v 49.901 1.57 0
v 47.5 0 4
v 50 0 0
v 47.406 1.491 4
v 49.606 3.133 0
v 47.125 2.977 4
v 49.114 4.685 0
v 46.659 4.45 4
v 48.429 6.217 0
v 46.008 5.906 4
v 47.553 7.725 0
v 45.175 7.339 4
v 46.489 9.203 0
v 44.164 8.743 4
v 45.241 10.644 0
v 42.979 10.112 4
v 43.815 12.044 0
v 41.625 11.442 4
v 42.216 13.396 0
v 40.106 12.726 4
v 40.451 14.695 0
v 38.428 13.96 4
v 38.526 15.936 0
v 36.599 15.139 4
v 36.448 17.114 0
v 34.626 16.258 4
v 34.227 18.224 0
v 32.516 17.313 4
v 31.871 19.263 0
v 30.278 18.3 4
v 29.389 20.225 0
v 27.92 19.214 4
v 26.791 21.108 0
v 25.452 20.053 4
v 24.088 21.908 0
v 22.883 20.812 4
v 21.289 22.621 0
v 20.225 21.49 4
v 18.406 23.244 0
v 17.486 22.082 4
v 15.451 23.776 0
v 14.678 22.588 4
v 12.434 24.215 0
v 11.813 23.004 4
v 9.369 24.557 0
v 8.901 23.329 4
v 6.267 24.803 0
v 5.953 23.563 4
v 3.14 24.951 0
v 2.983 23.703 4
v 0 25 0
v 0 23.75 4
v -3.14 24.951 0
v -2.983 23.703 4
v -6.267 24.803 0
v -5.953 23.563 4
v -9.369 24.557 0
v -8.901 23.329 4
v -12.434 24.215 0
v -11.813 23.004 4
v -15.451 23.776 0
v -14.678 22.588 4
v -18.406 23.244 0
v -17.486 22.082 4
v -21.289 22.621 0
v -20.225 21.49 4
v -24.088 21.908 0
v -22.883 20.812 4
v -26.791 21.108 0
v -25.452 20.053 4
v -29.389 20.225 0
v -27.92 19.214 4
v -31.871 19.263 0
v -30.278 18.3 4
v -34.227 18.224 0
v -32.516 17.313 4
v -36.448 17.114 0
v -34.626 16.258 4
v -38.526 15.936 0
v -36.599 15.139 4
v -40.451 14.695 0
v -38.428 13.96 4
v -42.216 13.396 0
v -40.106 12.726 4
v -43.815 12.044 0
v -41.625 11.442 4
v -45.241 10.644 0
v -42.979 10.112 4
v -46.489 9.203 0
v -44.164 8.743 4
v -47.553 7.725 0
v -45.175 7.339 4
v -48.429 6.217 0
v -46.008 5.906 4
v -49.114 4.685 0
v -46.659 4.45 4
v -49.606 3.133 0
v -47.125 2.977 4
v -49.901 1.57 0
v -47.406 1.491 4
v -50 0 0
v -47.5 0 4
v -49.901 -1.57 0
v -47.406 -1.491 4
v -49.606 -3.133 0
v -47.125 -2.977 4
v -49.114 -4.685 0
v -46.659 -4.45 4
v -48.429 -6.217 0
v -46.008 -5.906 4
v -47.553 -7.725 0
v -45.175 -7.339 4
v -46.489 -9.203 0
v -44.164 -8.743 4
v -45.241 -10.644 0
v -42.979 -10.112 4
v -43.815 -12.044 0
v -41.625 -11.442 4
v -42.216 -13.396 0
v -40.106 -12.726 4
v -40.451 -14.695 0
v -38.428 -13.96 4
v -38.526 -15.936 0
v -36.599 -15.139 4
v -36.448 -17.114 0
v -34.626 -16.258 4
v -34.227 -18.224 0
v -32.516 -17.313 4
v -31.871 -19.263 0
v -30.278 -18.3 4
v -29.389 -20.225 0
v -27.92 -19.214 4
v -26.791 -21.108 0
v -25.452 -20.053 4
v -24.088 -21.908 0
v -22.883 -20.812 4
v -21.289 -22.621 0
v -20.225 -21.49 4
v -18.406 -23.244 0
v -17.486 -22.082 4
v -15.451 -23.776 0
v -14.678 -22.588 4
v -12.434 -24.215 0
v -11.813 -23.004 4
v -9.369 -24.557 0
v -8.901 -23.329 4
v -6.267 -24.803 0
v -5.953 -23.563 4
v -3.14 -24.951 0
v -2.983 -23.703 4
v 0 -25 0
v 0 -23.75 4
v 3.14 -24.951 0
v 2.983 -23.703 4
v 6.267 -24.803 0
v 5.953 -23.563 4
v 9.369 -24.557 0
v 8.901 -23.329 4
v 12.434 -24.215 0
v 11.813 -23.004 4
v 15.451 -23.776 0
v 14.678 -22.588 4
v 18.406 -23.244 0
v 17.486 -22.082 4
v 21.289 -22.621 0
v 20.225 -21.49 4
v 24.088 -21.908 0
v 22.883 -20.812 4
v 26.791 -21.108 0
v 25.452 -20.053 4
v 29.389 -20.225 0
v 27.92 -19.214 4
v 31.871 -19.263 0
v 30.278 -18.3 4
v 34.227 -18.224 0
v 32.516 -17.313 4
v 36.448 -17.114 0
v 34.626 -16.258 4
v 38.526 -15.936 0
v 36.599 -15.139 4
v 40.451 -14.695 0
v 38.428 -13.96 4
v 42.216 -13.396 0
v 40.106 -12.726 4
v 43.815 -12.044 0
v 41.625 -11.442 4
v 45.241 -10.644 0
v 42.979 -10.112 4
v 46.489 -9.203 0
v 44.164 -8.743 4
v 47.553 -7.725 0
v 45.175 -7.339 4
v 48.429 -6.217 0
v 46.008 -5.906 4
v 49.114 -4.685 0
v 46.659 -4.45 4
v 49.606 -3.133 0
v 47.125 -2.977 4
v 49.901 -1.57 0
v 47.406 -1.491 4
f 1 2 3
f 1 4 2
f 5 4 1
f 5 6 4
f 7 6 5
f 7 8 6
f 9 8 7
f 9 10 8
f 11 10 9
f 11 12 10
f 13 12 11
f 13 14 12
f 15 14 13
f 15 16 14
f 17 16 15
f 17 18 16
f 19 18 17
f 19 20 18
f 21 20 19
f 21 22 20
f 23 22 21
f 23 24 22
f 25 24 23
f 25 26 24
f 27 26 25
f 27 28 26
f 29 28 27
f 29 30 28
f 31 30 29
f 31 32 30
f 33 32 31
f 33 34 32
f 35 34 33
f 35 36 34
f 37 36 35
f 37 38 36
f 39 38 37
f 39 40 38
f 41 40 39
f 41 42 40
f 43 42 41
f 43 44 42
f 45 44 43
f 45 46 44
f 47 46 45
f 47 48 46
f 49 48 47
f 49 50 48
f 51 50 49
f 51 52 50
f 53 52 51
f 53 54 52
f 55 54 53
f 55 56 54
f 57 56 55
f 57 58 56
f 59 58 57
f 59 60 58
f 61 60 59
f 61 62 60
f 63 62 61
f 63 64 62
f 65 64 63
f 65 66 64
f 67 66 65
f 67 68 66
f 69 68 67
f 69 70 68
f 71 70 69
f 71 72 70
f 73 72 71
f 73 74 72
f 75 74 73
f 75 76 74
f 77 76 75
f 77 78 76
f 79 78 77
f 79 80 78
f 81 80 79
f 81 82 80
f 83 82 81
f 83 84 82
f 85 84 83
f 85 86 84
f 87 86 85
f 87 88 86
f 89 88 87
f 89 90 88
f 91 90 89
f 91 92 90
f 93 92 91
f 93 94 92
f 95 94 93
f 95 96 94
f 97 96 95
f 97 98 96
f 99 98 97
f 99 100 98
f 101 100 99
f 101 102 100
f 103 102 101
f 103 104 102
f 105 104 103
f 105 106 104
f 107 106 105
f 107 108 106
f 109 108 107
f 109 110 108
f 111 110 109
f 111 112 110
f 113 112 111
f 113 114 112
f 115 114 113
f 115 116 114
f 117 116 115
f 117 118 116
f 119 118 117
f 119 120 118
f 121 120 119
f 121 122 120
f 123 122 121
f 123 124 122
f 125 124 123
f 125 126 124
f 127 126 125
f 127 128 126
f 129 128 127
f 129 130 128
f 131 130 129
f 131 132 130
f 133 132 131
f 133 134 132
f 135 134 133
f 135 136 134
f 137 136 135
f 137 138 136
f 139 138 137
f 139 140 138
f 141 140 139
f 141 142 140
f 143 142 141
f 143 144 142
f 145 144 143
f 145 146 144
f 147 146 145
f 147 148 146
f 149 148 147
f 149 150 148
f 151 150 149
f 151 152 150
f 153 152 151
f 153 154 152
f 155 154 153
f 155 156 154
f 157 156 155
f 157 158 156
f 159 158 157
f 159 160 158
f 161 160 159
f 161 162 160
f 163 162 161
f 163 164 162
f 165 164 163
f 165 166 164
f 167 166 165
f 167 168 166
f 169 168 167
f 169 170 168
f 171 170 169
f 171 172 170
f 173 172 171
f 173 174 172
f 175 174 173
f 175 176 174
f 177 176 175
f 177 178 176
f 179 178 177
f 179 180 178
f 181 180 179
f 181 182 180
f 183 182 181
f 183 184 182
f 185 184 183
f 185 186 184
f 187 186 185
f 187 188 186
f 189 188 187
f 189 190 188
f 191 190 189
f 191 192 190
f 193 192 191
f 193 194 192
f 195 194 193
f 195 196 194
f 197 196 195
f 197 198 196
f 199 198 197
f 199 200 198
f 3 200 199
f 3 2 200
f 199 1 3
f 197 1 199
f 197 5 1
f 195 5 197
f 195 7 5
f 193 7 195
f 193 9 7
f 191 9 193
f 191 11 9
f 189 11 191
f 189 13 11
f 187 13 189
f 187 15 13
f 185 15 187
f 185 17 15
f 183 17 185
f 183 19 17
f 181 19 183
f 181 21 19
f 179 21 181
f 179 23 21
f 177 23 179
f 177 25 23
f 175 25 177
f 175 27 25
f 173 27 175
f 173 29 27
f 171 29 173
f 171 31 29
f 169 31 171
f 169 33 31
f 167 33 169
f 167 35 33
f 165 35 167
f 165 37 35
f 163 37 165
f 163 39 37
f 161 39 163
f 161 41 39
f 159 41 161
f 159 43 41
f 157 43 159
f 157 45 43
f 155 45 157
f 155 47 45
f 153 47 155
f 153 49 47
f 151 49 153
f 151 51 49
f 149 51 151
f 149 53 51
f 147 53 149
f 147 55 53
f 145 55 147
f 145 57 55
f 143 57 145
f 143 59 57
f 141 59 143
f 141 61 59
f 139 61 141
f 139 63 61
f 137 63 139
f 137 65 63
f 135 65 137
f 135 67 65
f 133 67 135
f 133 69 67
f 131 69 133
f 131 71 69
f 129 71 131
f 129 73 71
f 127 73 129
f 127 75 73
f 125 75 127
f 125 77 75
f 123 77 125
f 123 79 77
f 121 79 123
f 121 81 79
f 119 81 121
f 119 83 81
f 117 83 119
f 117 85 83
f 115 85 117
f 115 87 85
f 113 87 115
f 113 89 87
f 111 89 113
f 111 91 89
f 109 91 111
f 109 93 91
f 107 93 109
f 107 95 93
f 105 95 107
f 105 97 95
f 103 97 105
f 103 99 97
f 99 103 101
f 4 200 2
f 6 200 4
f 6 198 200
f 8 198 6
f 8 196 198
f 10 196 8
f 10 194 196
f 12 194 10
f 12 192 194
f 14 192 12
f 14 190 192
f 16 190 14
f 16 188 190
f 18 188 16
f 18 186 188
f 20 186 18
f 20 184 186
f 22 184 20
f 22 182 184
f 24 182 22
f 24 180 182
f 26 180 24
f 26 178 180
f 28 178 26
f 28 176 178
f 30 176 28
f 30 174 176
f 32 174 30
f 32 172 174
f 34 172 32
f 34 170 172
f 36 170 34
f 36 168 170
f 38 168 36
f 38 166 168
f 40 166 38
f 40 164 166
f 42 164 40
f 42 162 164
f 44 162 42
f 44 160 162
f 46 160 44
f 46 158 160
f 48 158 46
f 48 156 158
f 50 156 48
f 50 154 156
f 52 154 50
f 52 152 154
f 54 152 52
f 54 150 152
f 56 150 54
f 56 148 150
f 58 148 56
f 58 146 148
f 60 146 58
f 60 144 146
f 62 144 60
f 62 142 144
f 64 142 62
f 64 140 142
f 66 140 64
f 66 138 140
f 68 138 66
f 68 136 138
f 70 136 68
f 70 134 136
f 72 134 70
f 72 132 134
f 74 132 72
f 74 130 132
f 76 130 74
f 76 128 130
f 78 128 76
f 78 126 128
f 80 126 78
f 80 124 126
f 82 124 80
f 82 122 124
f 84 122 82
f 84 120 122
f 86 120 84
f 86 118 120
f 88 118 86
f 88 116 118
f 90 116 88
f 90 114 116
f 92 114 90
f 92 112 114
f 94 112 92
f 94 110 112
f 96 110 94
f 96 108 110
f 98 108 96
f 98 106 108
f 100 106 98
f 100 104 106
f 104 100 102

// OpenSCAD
// file: ../build.scad
$build_id = "";

function building(filename) = is_undef(filename) ?
  !is_undef(build)
  : !is_undef(build) && build == filename;

function previewing() = !building();

module build(filename) {
  $build_id = filename;

  if(!is_undef(scad_build_scan) && scad_build_scan == true) {
    echo(str("scad_build_scan: ", filename));
  }
  else if(previewing() || build == filename) {
    children();
  }
}

module preview_row(spacing) {
  if(previewing()) {
    for(x = [0:1:$children - 1]) {
      translate([x * spacing, 0, 0]) {
        children(x);
      }
    }
  }
  else {
    children();
  }
}

module preview_column(spacing) {
  if(previewing()) {
    for(y = [0:1:$children - 1]) {
      translate([0, y * spacing, 0]) {
        children(y);
      }
    }
  }
  else {
    children();
  }
}
// file: ../minibase.scad
// Based off of titancraft's Customizable Miniature Base (CC0 1.0)
// https://www.thingiverse.com/thing:1112237

include <./build.scad>

$base_rim = 1; //	[1: tapered, 2: inclined, 3: flat]
// Number of sides:
$base_shape = 100; //	[30:Low-res Circle, 100: Hi-res Circle, 5:Pentagon, 6:Hexagon, 8:Octagon, 4:Square, 3:Triangle]

$base_diameter = 32;
$base_height = 4;
$base_slant = 95;

// Percentage:
$base_stretch = 100;

//(tapered base only)
$base_inner_circle_ratio = 40;

module tapered(r=40) {
  $base_rim = 1;
  $base_inner_circle_ratio = r;

  children();
}

module inclined() {
  $base_rim = 2;

  children();
}

module flat() {
  $base_rim = 3;

  children();
}

module shape(s) {
  $base_shape = s;

  children();
}

module diameter(d) {
  $base_diameter = d;

  children();
}

module height(h) {
  $base_height = h;

  children();
}

module slant(s) {
  $base_slant = s;

  children();
}

module stretch(s) {
  $base_stretch = s;

  children();
}

module base(id) {
  build(id) union() {
    radius = $base_diameter/2;
    scale([$base_stretch/100, 1, 1]){
      if ($base_rim == 1){
        // tapered base
        cyl1_height = $base_height * (1-$base_inner_circle_ratio/100);
        cylinder(cyl1_height, radius, radius * $base_slant/100, $fn=$base_shape);

        cyl2_radius = radius  * $base_slant/100 * .95;
        cyl2_height = $base_height - cyl1_height;

        translate([0, 0, cyl1_height]){
          cylinder(cyl2_height, cyl2_radius, cyl2_radius * $base_slant/100, $fn=$base_shape);
          cylinder(cyl2_height*.5, radius * $base_slant/100, cyl2_radius, $fn=$base_shape);
        }
      } else if ($base_rim == 2){
        // inclined base
        cylinder($base_height, radius, radius * $base_slant/100, $fn=$base_shape);
      } else if ($base_rim == 3){
        // flat base

        cylinder($base_height, radius, radius, $fn=$base_shape);
      }
    }
  }
}
// main file
include <../minibase.scad>

inclined() diameter(50) stretch(200) base("50x100mm-oprgw-monsters-chariots");
